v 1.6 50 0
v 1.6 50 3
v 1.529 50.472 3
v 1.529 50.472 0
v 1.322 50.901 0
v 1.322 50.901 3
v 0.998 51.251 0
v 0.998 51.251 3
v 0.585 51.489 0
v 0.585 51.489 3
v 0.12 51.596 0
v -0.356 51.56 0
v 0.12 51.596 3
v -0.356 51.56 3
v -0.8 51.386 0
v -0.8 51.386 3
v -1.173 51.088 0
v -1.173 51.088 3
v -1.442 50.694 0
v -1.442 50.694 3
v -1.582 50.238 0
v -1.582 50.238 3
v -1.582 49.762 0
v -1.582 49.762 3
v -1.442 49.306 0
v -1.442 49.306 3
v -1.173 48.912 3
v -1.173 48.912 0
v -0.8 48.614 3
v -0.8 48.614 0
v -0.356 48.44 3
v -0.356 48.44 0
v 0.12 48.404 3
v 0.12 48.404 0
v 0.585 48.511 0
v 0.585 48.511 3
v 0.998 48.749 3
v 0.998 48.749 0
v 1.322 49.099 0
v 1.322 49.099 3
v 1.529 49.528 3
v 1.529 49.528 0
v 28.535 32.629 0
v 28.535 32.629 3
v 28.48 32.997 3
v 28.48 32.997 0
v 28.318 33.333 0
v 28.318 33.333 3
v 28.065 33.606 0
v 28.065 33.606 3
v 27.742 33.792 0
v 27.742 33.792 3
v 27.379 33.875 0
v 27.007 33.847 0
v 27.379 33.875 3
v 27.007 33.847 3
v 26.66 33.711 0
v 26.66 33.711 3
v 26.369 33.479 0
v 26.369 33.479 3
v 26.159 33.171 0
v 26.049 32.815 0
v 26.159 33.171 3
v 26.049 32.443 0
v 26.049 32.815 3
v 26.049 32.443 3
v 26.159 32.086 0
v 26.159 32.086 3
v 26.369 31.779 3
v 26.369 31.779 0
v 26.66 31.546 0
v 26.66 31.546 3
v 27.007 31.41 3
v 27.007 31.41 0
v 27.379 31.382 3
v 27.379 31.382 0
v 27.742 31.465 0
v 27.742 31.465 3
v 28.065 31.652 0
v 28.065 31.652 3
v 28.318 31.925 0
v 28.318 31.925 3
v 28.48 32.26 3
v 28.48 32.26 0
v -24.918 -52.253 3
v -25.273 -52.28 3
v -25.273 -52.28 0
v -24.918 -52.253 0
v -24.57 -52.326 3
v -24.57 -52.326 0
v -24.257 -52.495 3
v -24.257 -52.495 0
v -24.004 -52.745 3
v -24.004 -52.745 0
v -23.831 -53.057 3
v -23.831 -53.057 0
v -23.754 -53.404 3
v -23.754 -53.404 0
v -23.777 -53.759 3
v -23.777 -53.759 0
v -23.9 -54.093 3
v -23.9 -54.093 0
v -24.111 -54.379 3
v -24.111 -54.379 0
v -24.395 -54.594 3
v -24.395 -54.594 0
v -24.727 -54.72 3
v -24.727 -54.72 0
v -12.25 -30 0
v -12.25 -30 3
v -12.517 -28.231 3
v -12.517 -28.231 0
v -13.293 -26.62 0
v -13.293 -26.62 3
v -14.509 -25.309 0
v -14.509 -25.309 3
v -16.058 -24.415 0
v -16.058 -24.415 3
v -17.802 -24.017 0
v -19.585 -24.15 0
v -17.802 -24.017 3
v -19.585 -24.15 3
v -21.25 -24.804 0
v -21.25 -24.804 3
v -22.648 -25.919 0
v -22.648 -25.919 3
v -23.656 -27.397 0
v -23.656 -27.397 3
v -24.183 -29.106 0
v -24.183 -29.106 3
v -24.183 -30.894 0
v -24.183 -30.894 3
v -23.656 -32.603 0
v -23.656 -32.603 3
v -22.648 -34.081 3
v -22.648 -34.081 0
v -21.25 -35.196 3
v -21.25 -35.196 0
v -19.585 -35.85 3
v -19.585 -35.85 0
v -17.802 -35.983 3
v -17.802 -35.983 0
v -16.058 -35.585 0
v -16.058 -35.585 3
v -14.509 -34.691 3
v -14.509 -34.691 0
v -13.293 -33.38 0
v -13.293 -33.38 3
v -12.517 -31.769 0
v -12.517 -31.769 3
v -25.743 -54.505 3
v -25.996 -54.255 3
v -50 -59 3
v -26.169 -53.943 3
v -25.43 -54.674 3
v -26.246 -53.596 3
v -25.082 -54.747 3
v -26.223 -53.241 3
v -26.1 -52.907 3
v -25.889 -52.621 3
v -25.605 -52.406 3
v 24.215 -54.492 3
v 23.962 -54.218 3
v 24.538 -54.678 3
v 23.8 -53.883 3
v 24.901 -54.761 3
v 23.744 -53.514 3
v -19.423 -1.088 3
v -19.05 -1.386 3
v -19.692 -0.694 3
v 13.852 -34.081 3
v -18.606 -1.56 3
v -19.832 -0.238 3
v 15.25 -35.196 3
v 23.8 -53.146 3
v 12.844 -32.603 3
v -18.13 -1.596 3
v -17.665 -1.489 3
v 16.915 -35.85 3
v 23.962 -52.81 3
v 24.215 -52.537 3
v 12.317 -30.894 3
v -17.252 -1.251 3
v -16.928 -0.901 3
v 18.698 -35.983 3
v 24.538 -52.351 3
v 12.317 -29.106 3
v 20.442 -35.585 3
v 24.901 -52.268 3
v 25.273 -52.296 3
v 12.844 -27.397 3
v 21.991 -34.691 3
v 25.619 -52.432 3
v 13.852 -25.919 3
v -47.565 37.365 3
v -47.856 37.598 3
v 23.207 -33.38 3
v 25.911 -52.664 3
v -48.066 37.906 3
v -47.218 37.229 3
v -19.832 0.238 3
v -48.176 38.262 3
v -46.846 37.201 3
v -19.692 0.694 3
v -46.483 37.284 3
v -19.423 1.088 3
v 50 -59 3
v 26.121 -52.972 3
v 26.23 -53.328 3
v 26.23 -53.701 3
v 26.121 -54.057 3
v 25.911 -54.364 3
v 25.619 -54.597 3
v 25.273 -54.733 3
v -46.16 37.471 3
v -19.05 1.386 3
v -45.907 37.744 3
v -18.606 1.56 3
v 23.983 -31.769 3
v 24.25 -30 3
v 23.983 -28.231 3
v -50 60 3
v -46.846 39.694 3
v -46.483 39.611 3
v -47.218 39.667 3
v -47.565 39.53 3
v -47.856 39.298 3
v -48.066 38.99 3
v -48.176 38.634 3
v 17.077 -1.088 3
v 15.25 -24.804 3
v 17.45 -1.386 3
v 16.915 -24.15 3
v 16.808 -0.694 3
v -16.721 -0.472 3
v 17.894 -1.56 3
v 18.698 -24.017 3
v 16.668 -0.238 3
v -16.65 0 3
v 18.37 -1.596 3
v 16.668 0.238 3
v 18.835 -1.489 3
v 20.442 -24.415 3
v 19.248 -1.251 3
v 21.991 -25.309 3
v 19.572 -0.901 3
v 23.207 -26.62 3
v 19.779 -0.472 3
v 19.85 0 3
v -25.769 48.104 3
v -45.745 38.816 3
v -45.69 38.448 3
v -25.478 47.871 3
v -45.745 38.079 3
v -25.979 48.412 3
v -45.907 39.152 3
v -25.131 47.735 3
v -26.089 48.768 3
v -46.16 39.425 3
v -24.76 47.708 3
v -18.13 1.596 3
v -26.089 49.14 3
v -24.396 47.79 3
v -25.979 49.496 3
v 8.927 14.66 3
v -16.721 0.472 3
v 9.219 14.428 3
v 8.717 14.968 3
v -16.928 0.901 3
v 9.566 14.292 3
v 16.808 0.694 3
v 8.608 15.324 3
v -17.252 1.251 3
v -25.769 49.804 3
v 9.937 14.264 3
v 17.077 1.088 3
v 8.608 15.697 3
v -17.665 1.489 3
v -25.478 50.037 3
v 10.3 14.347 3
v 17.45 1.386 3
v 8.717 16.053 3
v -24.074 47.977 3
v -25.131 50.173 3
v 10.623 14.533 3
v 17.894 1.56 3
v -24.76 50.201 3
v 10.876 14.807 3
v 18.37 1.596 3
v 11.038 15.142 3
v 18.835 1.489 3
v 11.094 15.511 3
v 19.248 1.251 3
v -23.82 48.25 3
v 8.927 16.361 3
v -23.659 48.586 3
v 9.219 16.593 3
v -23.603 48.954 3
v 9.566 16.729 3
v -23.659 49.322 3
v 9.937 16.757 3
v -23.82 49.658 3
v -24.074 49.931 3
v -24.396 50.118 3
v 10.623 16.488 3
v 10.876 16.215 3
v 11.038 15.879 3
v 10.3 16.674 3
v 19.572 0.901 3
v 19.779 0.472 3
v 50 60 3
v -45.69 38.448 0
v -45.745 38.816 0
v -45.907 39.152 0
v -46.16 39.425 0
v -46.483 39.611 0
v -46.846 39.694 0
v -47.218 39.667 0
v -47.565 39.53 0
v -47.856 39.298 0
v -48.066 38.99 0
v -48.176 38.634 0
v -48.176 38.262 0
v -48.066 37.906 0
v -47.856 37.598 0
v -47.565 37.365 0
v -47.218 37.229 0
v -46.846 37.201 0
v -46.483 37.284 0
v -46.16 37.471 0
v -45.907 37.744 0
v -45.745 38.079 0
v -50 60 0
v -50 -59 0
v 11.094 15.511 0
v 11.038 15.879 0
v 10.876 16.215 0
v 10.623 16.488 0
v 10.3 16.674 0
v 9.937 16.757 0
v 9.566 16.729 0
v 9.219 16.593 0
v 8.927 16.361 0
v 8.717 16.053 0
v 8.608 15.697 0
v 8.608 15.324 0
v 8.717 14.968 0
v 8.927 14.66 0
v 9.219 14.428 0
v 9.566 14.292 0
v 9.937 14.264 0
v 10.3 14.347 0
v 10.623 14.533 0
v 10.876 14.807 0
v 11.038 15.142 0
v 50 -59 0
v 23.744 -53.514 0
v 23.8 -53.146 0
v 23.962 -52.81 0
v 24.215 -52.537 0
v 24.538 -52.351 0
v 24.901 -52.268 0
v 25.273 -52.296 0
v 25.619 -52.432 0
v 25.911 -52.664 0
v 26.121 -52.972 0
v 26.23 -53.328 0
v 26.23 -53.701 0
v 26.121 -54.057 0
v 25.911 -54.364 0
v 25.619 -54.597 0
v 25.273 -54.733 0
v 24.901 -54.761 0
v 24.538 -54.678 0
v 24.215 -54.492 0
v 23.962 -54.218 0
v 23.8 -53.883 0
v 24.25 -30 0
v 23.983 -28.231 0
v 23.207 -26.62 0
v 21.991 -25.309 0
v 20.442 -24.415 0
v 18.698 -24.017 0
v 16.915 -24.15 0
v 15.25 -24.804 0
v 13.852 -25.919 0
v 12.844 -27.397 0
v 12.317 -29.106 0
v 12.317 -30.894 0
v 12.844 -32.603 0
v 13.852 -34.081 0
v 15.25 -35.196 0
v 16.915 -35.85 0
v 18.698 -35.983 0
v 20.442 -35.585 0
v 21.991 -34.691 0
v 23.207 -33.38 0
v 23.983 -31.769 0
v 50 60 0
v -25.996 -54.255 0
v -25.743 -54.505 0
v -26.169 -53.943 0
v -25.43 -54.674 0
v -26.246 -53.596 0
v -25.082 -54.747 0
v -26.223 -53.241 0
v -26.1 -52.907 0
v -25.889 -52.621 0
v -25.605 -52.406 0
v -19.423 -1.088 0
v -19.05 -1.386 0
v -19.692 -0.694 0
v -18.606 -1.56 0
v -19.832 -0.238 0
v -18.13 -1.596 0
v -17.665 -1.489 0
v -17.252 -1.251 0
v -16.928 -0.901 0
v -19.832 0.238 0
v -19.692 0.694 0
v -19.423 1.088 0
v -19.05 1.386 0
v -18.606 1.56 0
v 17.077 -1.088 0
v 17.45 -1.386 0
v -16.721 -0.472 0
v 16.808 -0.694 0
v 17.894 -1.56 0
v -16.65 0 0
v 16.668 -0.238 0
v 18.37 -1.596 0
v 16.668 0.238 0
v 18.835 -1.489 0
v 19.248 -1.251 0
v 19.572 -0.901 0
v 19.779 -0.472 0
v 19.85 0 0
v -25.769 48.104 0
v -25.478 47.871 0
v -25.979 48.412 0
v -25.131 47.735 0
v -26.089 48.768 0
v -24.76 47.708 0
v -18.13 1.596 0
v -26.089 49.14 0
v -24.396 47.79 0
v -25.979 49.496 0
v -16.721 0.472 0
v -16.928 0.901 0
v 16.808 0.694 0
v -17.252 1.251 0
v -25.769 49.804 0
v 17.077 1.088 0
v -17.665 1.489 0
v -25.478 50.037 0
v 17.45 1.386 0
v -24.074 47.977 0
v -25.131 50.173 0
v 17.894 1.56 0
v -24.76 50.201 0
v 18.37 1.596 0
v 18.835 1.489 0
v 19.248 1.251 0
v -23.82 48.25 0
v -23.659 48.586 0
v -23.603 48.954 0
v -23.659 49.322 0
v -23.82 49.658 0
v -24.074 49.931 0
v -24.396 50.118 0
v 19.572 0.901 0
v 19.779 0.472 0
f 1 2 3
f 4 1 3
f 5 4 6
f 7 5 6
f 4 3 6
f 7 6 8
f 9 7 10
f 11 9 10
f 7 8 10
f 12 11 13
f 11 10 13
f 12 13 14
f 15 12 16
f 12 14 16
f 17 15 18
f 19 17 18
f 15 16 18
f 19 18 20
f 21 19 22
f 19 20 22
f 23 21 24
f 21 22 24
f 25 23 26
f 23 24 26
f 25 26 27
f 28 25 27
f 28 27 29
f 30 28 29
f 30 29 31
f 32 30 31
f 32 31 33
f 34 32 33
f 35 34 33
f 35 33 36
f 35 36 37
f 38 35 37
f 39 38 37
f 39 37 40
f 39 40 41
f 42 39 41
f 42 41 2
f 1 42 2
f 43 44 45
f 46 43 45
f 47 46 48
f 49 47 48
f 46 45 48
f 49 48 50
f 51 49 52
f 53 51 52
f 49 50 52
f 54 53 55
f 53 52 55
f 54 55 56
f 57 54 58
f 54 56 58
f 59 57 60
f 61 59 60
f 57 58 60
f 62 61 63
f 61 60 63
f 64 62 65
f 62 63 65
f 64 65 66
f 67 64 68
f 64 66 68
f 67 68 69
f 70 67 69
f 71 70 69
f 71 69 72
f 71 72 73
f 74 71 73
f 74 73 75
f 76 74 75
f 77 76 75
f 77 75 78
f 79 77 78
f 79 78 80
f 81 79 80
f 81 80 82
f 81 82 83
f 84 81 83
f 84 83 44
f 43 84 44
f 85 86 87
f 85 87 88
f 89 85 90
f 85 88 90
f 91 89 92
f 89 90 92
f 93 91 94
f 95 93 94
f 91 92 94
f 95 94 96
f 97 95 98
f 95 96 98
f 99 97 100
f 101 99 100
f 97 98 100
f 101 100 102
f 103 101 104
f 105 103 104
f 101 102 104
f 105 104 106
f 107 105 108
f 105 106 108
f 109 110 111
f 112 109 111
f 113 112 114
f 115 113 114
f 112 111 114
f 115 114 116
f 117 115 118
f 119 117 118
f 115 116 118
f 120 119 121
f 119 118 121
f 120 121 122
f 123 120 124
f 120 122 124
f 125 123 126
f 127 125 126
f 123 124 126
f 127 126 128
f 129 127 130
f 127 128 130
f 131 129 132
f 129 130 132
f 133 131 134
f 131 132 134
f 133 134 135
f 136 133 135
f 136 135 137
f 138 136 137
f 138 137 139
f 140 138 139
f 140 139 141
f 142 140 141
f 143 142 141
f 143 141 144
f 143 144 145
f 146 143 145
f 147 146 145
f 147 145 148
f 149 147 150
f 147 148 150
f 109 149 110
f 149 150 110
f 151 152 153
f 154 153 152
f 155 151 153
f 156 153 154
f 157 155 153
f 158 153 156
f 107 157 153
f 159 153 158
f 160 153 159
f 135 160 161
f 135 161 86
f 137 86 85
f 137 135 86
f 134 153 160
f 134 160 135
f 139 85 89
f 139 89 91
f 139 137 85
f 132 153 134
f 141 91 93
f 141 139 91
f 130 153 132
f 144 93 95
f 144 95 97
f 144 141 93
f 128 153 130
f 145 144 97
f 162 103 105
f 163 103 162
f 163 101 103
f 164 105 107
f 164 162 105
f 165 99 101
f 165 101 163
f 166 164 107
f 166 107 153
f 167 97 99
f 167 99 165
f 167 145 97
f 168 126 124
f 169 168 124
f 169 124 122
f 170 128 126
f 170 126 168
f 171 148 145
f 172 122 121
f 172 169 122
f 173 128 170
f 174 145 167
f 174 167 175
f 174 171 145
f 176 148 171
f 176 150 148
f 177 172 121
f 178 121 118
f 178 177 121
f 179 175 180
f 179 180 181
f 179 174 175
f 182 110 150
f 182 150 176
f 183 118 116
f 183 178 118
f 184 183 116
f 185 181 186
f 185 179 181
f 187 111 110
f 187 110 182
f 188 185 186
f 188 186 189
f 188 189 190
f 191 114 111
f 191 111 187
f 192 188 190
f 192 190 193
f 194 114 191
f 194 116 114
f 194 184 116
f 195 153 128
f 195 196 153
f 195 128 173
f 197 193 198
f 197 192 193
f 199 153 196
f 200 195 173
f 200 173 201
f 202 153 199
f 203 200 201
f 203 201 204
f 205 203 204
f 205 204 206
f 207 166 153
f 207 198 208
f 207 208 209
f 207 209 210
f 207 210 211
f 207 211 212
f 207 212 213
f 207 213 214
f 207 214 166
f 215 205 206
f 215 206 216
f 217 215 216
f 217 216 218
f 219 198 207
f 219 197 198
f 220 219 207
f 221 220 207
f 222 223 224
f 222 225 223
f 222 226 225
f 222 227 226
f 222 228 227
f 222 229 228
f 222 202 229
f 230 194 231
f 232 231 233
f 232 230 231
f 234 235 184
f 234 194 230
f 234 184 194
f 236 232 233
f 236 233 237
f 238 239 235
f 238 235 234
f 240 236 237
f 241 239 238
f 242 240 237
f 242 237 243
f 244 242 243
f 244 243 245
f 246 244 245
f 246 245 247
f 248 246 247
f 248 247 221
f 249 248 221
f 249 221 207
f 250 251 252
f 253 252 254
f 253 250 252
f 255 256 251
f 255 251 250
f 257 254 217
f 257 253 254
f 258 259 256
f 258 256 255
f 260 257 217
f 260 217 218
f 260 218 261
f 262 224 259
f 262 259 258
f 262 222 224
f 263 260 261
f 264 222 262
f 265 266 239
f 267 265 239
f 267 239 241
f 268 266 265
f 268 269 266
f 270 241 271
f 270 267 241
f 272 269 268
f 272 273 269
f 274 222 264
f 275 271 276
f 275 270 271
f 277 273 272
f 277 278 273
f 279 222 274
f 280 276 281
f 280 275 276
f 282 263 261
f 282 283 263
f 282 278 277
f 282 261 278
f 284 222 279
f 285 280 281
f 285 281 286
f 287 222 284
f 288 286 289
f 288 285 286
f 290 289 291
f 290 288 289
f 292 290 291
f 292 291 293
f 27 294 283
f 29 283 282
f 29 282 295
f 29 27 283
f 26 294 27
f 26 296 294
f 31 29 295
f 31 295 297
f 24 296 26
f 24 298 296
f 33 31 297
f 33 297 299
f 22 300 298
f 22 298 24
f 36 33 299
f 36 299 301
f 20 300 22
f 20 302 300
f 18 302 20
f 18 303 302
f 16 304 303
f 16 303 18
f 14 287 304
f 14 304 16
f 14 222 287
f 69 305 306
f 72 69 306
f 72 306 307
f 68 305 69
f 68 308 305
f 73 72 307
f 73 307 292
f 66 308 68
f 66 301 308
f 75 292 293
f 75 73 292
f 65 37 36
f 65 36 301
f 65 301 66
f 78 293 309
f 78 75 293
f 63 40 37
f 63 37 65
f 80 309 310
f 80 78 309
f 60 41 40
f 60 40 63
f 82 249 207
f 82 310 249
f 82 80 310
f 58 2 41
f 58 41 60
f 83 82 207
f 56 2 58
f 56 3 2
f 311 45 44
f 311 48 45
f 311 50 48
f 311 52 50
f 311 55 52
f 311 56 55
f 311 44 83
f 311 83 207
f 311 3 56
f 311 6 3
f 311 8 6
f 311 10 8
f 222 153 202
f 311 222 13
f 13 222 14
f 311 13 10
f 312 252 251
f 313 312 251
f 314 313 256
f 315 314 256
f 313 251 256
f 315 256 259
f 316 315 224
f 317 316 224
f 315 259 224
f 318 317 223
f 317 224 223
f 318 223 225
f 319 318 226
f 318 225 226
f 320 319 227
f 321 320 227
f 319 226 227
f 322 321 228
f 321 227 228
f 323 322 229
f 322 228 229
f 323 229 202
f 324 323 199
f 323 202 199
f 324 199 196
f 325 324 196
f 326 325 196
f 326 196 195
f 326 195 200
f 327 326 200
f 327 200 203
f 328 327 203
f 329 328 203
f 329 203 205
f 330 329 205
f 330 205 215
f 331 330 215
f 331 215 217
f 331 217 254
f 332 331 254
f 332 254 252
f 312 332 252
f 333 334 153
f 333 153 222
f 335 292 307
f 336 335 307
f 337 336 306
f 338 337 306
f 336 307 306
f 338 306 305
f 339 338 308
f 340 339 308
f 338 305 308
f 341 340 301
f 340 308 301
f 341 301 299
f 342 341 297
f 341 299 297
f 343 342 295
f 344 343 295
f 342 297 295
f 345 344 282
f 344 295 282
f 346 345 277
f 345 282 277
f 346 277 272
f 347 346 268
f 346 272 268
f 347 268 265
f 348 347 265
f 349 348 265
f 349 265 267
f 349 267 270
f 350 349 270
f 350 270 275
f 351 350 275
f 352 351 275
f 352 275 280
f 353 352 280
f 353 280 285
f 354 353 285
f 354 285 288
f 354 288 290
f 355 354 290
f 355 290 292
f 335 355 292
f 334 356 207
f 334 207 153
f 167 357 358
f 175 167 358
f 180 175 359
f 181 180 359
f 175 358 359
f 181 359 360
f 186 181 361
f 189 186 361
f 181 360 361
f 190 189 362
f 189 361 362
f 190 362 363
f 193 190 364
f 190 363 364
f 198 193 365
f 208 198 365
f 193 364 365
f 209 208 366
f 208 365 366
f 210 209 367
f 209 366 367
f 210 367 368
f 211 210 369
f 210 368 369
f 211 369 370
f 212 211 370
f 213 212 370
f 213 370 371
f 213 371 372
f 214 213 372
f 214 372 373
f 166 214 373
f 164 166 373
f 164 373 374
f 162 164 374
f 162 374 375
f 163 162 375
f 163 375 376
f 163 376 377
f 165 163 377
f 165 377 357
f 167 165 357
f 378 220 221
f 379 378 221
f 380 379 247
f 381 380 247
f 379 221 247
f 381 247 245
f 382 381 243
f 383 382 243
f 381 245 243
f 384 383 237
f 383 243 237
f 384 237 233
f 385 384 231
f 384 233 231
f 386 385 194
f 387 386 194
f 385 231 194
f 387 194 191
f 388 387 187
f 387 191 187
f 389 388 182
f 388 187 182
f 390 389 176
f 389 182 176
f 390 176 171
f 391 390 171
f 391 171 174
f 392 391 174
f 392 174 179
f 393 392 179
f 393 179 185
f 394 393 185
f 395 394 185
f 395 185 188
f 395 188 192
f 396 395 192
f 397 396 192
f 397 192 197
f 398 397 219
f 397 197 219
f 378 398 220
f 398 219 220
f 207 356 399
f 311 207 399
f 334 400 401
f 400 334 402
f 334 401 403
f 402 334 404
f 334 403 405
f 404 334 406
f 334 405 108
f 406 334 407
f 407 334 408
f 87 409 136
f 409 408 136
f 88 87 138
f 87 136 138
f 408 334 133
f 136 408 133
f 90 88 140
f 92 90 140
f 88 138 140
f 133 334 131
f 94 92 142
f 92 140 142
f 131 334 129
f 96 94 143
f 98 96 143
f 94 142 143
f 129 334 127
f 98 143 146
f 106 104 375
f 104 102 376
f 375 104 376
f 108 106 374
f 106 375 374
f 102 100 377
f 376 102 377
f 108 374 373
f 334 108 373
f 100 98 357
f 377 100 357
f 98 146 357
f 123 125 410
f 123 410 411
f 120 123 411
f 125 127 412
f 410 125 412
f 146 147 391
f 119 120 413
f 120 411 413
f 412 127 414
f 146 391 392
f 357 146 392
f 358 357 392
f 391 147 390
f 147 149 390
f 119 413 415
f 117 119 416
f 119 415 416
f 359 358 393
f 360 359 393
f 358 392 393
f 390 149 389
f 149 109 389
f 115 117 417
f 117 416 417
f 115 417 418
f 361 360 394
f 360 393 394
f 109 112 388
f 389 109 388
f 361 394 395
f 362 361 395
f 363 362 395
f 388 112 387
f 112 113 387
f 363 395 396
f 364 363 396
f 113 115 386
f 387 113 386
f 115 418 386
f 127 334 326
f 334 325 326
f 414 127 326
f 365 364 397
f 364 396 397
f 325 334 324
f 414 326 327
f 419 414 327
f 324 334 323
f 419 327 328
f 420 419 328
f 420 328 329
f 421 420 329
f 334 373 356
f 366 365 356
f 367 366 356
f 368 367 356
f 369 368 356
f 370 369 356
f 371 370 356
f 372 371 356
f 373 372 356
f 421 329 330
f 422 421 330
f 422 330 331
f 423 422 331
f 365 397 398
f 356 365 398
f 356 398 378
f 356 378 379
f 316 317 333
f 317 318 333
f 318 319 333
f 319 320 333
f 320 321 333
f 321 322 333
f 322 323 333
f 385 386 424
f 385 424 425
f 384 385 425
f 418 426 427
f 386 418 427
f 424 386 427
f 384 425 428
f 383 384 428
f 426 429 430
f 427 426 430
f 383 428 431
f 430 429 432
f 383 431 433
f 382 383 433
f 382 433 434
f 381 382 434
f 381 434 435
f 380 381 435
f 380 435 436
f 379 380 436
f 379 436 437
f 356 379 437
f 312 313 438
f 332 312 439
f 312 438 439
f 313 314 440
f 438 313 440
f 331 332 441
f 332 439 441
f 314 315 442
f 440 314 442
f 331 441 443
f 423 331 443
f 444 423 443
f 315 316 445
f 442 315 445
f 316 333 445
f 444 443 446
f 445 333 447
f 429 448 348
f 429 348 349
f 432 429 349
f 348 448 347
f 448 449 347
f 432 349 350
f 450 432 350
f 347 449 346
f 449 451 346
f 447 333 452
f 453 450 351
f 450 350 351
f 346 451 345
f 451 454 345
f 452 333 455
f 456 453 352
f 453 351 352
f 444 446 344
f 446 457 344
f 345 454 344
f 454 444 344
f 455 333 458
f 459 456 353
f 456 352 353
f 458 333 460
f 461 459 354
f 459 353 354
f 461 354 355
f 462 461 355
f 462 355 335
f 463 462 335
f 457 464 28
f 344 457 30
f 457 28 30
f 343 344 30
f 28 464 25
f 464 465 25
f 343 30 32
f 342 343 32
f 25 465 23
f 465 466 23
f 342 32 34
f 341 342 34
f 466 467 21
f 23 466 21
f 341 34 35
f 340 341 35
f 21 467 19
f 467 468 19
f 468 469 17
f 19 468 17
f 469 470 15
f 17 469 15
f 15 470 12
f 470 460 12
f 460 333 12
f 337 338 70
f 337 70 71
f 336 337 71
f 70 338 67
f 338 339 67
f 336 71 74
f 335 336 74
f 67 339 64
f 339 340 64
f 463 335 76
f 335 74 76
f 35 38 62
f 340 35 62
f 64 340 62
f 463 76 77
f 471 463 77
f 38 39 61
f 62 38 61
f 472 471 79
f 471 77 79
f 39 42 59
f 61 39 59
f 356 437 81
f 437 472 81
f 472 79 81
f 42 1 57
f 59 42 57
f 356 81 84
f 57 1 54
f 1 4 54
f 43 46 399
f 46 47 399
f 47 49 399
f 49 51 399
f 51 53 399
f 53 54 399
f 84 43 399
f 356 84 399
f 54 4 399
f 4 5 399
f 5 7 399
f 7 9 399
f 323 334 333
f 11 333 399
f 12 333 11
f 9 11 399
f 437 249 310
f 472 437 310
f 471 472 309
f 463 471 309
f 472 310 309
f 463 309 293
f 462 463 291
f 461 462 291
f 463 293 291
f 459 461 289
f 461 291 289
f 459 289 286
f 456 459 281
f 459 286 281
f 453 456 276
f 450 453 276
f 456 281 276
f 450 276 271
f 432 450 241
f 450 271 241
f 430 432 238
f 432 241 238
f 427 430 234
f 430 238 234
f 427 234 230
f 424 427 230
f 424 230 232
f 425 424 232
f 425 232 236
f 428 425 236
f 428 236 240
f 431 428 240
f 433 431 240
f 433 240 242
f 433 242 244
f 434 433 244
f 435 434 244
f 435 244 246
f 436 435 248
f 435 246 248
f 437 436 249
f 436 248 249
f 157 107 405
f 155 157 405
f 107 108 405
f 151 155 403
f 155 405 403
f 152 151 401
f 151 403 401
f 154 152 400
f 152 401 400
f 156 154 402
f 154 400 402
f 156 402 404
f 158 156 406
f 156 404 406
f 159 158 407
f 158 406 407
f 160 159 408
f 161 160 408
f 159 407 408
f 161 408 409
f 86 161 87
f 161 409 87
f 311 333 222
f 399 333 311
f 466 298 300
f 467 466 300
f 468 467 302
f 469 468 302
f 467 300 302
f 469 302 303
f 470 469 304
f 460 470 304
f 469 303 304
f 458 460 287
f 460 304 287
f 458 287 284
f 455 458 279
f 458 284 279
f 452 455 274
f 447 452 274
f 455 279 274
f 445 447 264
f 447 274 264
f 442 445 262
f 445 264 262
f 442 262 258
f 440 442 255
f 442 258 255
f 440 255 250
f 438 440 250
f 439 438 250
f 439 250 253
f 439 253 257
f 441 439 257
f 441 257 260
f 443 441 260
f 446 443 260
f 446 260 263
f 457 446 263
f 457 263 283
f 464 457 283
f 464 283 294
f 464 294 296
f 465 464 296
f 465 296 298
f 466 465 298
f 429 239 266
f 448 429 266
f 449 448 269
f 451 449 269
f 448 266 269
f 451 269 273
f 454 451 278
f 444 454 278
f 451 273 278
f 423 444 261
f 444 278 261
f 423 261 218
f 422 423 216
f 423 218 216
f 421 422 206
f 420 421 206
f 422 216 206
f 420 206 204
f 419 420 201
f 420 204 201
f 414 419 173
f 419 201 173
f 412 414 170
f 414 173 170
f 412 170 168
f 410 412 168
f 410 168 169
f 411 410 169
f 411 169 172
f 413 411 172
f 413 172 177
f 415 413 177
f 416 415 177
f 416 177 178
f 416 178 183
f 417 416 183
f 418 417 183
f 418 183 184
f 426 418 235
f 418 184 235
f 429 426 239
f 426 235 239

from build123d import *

# Parameters (mm, degrees)
SKETCH_1_W          = 100
SKETCH_1_H          = 120
SKETCH_1_R          = 1.6
SKETCH_1_R_2        = 1.7
EXTRUDE_1_DEPTH     = 3
SKETCH_2_R          = 6
CUT_EXTRUDE_1_DEPTH = 3
SKETCH_3_R          = 1.6
CUT_EXTRUDE_2_DEPTH = 3
SKETCH_5_R          = 1.6
CUT_EXTRUDE_4_DEPTH = 10
SKETCH_6_W          = 100
SKETCH_6_H          = 3
CUT_EXTRUDE_5_DEPTH = 1
M3X0_5_2_D          = 2.5
M3X0_5_2_DEPTH      = 8.5
M3X0_5_2_TIP        = 0.751075774
M3X0_5_4_D          = 2.5
M3X0_5_4_DEPTH      = 8.5
M3X0_5_4_TIP        = 0.751075774


with BuildPart() as part:
    # ｽｹｯﾁ1 → ﾎﾞｽ - 押し出し1 (new body)
    with BuildSketch(Plane.XY):
        Rectangle(SKETCH_1_W, SKETCH_1_H)
        with Locations((27.323825812, 32.591356486)):
            Circle(SKETCH_1_R, mode=Mode.SUBTRACT)
        with Locations((9.838236374, 15.468735133)):
            Circle(SKETCH_1_R, mode=Mode.SUBTRACT)
        with Locations((-24.839988255, 48.970021629)):
            Circle(SKETCH_1_R, mode=Mode.SUBTRACT)
        with Locations((-46.955532443, 38.489911645)):
            Circle(SKETCH_1_R_2, mode=Mode.SUBTRACT)
        with Locations((-46.955532443, 38.489911645)):
            Circle(SKETCH_1_R_2)
        with Locations((-24.839988255, 48.970021629)):
            Circle(SKETCH_1_R)
        with Locations((9.838236374, 15.468735133)):
            Circle(SKETCH_1_R)
        with Locations((27.323825812, 32.591356486)):
            Circle(SKETCH_1_R)
    extrude(amount=EXTRUDE_1_DEPTH)

    # ｽｹｯﾁ2 → ｶｯﾄ - 押し出し1 (cut)
    with BuildSketch(Plane.XY.offset(3)):
        with Locations((18.25, -30)):
            Circle(SKETCH_2_R)
        with Locations((-18.25, -30)):
            Circle(SKETCH_2_R)
    extrude(amount=-CUT_EXTRUDE_1_DEPTH, mode=Mode.SUBTRACT)

    # ｽｹｯﾁ3 → ｶｯﾄ - 押し出し2 (cut)
    with BuildSketch(Plane.XY.offset(3)):
        with Locations((18.25, 0)):
            Circle(SKETCH_3_R)
        with Locations((-18.25, 0)):
            Circle(SKETCH_3_R)
    extrude(amount=-CUT_EXTRUDE_2_DEPTH, mode=Mode.SUBTRACT)

    # ｽｹｯﾁ5 → ｶｯﾄ - 押し出し4 (cut)
    with BuildSketch(Plane.XY.offset(3)):
        with Locations((0, 50)):
            Circle(SKETCH_5_R)
    extrude(amount=-CUT_EXTRUDE_4_DEPTH, mode=Mode.SUBTRACT)

    # ｽｹｯﾁ6 → ｶｯﾄ - 押し出し5 (cut)
    with BuildSketch(Plane(origin=(0, -60, 0), x_dir=(-1, 0, 0), z_dir=(0, -1, 0))):
        with Locations((0, -1.5)):
            Rectangle(SKETCH_6_W, SKETCH_6_H)
    extrude(amount=-CUT_EXTRUDE_5_DEPTH, mode=Mode.SUBTRACT)

    # M3x0.5 ねじ穴2
    with Locations(Plane(origin=(-24.853088108, 48.954010468, 0), x_dir=(-1, 0, 0), z_dir=(0, 0, -1))):
        with Locations((0, 0), (-52.138387466, -16.325171933), (-34.696786927, -33.443354168), (22.086677003, -10.506105498)):
            Hole(M3X0_5_2_D / 2, depth=M3X0_5_2_DEPTH)
            with Locations((0, 0, -(M3X0_5_2_DEPTH + M3X0_5_2_TIP / 2))):  # 118° drill point
                Cone(0, M3X0_5_2_D / 2, M3X0_5_2_TIP, mode=Mode.SUBTRACT)

    # M3x0.5 ねじ穴4
    with Locations(Plane(origin=(-25.000041654, -53.500009307, 3), x_dir=(1, 0, 0), z_dir=(0, 0, 1))):
        with Locations((0, 0), (4.1654e-05, 9.307e-06), (49.994493901, -0.014222141)):
            Hole(M3X0_5_4_D / 2, depth=M3X0_5_4_DEPTH)
            with Locations((0, 0, -(M3X0_5_4_DEPTH + M3X0_5_4_TIP / 2))):  # 118° drill point
                Cone(0, M3X0_5_4_D / 2, M3X0_5_4_TIP, mode=Mode.SUBTRACT)


solid = part.part
